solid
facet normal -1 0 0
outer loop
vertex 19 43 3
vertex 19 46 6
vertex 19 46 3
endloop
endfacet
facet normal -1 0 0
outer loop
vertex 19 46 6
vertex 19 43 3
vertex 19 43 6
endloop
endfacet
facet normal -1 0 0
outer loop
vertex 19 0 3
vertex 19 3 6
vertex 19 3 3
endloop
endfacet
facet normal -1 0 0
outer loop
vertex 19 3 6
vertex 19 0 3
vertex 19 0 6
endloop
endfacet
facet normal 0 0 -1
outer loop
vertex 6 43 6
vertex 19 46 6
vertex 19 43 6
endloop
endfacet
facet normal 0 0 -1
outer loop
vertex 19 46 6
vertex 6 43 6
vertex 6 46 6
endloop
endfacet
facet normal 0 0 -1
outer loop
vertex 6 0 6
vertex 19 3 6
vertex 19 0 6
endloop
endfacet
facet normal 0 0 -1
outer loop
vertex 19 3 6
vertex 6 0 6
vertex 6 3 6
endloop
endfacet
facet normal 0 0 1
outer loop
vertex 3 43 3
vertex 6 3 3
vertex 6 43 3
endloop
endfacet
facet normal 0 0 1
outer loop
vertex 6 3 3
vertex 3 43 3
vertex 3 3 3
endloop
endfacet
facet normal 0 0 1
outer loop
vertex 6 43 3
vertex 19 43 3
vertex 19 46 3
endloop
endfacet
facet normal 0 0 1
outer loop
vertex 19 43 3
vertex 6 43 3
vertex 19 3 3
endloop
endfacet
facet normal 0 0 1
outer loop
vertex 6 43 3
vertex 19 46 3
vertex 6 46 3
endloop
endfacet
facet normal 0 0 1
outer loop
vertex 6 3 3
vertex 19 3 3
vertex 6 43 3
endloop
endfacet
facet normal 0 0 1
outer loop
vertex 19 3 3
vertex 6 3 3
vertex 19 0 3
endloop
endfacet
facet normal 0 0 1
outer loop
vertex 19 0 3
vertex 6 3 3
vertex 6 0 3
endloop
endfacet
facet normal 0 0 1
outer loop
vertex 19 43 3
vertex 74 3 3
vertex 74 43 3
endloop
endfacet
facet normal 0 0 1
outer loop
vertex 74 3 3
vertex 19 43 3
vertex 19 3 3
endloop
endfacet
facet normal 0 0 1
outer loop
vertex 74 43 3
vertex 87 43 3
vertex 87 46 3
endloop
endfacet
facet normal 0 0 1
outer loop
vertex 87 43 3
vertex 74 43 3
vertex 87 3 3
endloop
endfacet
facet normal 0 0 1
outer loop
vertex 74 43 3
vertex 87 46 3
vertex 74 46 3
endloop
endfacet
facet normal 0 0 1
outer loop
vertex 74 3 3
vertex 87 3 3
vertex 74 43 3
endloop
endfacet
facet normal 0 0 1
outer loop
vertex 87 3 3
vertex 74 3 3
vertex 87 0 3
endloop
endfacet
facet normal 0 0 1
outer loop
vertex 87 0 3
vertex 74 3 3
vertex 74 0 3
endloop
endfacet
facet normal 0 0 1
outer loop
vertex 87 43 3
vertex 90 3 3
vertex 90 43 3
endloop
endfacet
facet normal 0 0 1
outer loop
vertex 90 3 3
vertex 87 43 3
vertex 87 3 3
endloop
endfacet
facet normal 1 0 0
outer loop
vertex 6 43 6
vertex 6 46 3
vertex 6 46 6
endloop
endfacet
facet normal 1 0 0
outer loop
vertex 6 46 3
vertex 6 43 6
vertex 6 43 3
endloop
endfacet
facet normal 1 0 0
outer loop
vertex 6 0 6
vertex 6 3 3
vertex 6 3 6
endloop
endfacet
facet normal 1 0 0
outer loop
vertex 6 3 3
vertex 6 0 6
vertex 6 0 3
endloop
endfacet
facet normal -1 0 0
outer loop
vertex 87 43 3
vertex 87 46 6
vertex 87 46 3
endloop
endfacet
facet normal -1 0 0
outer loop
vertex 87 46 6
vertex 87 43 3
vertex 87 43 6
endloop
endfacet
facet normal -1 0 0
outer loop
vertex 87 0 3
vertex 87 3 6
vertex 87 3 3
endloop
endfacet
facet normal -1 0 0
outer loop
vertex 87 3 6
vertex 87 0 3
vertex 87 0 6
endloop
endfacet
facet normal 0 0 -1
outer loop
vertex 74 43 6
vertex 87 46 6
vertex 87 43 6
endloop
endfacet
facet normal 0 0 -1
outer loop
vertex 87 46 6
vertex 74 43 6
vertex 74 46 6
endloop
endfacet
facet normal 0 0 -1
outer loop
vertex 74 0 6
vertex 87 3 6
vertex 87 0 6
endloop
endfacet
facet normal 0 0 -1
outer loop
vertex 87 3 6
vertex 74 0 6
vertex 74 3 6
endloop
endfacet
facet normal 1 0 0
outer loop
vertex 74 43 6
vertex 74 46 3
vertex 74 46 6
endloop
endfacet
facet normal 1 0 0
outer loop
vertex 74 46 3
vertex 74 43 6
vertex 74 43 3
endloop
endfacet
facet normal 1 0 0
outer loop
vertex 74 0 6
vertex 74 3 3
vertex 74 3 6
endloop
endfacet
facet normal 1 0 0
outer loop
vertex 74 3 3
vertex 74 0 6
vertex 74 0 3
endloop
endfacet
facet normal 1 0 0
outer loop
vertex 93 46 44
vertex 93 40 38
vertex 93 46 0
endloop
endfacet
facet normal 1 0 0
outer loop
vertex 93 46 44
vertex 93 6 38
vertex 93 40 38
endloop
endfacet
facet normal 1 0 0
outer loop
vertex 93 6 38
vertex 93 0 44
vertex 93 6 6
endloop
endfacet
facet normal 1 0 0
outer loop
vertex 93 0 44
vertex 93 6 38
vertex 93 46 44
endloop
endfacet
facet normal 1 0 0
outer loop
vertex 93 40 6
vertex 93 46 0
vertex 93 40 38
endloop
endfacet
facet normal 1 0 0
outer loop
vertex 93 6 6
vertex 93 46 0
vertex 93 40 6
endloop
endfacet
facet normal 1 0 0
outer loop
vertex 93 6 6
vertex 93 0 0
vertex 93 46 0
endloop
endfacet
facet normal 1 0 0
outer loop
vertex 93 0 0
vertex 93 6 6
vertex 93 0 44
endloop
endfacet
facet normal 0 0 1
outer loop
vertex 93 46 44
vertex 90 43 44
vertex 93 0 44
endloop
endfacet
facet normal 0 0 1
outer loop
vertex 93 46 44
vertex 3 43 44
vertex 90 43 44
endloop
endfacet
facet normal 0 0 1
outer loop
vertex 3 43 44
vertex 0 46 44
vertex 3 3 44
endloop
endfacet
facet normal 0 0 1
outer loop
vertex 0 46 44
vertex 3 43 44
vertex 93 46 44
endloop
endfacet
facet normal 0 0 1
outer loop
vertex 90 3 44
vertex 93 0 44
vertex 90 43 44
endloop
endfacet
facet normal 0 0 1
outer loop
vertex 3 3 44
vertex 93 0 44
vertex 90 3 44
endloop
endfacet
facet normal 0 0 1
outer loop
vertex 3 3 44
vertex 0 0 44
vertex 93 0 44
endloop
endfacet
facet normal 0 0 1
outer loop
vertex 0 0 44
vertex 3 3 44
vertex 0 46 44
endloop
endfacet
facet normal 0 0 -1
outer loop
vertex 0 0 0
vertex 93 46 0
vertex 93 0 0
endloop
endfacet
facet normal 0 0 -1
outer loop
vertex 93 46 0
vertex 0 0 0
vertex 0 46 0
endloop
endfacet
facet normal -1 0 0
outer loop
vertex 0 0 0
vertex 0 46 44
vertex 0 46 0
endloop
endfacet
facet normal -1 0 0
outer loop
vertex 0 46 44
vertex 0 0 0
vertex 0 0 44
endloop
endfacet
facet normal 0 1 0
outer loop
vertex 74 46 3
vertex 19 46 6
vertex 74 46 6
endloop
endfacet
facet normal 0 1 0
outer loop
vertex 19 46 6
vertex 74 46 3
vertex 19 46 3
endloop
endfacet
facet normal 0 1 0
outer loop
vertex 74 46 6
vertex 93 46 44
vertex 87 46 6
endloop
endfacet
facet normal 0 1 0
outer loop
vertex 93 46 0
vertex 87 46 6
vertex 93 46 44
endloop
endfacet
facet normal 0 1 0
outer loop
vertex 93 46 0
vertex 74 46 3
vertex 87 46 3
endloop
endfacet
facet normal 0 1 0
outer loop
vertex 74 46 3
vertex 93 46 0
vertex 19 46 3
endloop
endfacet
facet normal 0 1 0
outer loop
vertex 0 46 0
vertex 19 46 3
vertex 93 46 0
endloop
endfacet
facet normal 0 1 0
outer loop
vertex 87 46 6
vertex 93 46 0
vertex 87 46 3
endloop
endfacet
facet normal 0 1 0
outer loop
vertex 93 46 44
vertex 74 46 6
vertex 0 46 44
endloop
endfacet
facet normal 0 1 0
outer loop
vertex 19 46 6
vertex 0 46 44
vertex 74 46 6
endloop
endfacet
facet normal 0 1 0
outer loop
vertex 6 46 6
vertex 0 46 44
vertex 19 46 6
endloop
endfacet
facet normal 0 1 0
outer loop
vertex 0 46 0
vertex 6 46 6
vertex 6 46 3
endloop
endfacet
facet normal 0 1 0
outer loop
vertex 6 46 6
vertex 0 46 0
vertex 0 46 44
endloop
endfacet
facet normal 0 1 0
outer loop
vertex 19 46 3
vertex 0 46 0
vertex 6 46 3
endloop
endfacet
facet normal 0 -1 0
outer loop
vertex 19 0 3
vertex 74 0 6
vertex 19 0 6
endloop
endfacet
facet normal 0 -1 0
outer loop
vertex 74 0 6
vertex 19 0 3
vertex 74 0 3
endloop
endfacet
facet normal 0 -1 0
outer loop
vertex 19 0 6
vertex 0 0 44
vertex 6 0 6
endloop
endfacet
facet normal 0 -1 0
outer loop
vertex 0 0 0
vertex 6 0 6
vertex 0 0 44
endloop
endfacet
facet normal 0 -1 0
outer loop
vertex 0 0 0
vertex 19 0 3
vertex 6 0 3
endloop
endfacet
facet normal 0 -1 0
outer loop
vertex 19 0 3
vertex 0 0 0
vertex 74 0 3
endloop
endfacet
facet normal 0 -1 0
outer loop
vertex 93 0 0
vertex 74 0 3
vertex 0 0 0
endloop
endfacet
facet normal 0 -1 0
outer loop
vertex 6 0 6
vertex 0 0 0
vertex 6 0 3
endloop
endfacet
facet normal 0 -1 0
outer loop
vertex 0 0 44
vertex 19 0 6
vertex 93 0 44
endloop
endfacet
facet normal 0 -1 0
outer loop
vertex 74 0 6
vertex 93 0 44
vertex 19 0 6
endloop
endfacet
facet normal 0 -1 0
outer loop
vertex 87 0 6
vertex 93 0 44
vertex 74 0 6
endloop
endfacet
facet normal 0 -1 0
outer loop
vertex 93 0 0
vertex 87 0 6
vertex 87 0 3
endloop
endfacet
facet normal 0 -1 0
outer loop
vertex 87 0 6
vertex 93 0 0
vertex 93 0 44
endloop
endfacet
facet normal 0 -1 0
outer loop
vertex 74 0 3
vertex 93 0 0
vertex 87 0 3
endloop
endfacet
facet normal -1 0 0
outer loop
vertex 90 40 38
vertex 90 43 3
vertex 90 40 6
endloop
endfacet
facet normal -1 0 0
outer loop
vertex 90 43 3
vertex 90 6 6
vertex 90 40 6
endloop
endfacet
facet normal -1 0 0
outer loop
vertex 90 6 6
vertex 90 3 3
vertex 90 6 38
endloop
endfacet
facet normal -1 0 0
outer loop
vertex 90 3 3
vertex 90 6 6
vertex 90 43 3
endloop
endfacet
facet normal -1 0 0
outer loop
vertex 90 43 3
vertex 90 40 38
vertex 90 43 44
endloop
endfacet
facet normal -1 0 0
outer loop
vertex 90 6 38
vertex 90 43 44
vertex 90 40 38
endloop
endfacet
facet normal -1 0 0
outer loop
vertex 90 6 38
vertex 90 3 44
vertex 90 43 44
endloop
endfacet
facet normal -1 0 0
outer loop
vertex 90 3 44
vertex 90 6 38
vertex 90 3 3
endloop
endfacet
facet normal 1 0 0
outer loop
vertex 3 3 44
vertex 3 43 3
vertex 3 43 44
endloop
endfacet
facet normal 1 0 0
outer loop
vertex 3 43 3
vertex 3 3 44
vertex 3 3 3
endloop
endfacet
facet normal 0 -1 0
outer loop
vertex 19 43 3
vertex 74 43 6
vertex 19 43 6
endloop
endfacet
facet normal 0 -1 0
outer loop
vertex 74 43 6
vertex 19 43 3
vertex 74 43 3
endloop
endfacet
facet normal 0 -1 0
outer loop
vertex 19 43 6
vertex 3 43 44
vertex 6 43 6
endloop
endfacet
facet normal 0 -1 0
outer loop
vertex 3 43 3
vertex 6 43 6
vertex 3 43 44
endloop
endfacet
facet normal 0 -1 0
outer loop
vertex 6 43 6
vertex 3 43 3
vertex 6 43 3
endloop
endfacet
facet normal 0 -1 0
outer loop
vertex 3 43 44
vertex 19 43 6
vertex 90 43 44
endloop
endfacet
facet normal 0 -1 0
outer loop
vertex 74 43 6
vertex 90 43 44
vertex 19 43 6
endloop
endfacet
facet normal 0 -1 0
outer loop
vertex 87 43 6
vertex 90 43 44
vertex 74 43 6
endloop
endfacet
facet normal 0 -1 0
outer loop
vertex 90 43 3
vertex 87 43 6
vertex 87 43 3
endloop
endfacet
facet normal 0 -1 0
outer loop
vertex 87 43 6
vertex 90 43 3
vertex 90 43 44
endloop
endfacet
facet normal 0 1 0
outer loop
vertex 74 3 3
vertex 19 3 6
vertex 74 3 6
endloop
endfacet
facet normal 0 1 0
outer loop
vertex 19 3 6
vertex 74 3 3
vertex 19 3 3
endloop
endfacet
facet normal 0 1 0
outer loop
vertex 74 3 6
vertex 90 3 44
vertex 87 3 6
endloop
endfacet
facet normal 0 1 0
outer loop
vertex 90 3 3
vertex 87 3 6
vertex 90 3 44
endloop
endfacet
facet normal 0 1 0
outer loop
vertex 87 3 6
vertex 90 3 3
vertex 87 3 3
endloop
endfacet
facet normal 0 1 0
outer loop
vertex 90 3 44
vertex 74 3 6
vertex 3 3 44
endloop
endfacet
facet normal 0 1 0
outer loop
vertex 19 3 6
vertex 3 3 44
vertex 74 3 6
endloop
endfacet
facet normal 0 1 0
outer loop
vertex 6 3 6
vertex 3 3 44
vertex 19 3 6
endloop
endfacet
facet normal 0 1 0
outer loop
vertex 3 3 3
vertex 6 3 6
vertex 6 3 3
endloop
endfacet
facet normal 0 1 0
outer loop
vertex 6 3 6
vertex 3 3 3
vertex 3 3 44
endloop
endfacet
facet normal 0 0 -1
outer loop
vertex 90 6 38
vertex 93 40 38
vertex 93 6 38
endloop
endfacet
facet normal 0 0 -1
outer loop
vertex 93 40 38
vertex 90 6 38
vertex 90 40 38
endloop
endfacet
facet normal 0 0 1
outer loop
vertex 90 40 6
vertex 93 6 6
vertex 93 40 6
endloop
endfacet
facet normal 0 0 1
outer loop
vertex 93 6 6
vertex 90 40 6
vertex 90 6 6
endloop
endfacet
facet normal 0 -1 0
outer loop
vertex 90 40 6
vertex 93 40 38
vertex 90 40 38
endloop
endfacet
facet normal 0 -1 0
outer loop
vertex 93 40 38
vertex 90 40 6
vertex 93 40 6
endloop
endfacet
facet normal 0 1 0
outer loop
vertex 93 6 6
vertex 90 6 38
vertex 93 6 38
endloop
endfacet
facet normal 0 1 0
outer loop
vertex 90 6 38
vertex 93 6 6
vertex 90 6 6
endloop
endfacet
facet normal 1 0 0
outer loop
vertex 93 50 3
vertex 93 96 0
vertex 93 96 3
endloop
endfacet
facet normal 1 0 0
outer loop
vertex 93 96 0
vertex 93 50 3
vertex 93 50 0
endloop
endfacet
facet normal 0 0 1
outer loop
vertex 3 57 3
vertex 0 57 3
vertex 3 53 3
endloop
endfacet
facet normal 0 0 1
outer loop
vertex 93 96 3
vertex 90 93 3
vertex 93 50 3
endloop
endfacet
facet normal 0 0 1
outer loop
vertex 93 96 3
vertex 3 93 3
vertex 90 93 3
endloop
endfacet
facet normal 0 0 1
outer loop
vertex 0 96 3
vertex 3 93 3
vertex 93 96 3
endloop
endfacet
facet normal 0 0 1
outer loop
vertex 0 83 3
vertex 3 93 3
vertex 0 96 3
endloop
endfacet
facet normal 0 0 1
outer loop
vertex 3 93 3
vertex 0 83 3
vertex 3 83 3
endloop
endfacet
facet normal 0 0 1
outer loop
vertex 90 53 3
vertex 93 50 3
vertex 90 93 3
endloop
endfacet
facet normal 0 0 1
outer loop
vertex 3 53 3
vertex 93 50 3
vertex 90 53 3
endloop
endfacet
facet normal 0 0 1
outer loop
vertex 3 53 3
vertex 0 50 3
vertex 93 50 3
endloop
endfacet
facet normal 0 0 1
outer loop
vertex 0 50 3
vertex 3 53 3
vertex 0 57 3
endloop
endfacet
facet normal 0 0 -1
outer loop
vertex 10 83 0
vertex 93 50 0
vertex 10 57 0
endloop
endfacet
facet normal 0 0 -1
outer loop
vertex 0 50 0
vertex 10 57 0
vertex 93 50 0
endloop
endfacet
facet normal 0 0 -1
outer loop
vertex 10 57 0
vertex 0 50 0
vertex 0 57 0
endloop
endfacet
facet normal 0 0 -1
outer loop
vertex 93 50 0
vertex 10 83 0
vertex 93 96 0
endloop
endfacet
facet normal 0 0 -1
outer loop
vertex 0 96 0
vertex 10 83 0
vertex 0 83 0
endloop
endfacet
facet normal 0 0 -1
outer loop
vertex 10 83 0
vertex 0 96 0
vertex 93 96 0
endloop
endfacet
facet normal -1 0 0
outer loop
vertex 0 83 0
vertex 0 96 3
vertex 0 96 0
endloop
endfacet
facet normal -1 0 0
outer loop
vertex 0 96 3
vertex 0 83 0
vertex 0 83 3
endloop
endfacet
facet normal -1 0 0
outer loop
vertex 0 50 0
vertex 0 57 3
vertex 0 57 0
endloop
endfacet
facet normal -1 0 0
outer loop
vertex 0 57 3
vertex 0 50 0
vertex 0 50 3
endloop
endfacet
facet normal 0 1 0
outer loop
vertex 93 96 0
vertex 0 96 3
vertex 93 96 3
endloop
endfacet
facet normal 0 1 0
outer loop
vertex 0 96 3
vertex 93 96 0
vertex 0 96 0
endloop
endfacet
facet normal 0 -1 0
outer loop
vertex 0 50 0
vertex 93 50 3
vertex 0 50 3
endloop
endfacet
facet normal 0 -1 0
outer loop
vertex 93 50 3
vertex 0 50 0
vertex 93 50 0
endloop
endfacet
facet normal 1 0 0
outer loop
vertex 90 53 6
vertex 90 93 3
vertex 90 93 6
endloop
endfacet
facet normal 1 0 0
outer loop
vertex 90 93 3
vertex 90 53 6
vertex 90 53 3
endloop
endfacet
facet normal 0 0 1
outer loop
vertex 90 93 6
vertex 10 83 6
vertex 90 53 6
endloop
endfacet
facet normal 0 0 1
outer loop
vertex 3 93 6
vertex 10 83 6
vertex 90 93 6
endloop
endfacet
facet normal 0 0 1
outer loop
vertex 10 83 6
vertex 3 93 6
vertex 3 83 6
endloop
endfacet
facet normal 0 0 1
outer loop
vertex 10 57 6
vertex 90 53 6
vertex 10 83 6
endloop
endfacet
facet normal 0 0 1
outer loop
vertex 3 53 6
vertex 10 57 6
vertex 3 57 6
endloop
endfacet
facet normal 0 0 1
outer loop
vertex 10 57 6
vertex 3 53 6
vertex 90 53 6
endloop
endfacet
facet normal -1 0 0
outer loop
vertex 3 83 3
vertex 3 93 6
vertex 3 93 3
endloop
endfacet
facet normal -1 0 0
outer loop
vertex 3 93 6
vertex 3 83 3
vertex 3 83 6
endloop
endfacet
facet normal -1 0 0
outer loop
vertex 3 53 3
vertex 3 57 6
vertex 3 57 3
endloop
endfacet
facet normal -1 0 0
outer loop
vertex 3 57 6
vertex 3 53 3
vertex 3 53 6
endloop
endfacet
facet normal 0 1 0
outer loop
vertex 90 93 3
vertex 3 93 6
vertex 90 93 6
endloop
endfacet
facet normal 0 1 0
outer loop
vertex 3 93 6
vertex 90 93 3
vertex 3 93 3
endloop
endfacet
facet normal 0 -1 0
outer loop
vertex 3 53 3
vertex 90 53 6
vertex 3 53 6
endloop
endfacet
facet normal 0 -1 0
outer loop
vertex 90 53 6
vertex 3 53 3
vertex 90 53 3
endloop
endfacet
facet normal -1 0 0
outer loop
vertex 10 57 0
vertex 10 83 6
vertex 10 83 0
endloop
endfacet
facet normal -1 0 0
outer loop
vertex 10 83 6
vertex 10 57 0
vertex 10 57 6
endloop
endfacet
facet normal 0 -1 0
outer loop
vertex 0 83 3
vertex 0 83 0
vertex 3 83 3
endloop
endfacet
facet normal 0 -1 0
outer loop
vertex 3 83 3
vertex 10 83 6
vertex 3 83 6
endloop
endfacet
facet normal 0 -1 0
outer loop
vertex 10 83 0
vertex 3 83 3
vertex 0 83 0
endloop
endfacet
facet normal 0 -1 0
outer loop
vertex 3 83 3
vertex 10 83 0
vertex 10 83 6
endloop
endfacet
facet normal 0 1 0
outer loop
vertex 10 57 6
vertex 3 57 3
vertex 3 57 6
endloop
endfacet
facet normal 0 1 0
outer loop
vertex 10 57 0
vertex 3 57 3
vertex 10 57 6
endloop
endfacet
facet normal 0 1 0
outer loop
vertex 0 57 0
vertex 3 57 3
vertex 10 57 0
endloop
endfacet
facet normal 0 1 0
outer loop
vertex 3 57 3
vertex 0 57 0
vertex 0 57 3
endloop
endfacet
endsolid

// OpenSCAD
// dimensions of the device that should be enclosed (in mm)
h = 35;
width = 40;
length = 87;

thickness = 3; // thickness of the walls

//cutout
cWidth = 26;
cLength = 17;

// Wheter to provide a hole for the velcro-streps
strapholder = true;
sWidth = 13;
sHeight = 3;

// Calculated properties for later use
dthick = 2*thickness;

 height = strapholder ? h + sHeight : h;

// outer dimensions
oLength = length+dthick;
oWidth = width+dthick;
oHeight = height+dthick;

// Box
difference() {    
    cube([oLength,oWidth,oHeight]);       
    
    if(strapholder){
        translate(v=[dthick, - 0.5, thickness])  cube([sWidth, oWidth+1, sHeight]);
        translate([oLength-dthick-sWidth, - 0.5, thickness])  cube([sWidth, oWidth+1, sHeight]);        
    }
       
    translate(v=[thickness,thickness,thickness])  cube([length,width, oHeight]);
    translate(v=[length,dthick,dthick])  cube([dthick*2, width-dthick, height-dthick ]);        
}

// Lid
translate(v=[0, width+10, 0]){
    difference(){
            // Lid itself
        union() {
            cube([oLength,oWidth,thickness]);
            translate(v=[thickness, thickness, thickness]) cube([length, width, thickness]);            
        }
            //cutout
         translate(v=[0, width/2, thickness]) cube([cLength+ thickness, cWidth, dthick+1], center = true);             
    }      
}
